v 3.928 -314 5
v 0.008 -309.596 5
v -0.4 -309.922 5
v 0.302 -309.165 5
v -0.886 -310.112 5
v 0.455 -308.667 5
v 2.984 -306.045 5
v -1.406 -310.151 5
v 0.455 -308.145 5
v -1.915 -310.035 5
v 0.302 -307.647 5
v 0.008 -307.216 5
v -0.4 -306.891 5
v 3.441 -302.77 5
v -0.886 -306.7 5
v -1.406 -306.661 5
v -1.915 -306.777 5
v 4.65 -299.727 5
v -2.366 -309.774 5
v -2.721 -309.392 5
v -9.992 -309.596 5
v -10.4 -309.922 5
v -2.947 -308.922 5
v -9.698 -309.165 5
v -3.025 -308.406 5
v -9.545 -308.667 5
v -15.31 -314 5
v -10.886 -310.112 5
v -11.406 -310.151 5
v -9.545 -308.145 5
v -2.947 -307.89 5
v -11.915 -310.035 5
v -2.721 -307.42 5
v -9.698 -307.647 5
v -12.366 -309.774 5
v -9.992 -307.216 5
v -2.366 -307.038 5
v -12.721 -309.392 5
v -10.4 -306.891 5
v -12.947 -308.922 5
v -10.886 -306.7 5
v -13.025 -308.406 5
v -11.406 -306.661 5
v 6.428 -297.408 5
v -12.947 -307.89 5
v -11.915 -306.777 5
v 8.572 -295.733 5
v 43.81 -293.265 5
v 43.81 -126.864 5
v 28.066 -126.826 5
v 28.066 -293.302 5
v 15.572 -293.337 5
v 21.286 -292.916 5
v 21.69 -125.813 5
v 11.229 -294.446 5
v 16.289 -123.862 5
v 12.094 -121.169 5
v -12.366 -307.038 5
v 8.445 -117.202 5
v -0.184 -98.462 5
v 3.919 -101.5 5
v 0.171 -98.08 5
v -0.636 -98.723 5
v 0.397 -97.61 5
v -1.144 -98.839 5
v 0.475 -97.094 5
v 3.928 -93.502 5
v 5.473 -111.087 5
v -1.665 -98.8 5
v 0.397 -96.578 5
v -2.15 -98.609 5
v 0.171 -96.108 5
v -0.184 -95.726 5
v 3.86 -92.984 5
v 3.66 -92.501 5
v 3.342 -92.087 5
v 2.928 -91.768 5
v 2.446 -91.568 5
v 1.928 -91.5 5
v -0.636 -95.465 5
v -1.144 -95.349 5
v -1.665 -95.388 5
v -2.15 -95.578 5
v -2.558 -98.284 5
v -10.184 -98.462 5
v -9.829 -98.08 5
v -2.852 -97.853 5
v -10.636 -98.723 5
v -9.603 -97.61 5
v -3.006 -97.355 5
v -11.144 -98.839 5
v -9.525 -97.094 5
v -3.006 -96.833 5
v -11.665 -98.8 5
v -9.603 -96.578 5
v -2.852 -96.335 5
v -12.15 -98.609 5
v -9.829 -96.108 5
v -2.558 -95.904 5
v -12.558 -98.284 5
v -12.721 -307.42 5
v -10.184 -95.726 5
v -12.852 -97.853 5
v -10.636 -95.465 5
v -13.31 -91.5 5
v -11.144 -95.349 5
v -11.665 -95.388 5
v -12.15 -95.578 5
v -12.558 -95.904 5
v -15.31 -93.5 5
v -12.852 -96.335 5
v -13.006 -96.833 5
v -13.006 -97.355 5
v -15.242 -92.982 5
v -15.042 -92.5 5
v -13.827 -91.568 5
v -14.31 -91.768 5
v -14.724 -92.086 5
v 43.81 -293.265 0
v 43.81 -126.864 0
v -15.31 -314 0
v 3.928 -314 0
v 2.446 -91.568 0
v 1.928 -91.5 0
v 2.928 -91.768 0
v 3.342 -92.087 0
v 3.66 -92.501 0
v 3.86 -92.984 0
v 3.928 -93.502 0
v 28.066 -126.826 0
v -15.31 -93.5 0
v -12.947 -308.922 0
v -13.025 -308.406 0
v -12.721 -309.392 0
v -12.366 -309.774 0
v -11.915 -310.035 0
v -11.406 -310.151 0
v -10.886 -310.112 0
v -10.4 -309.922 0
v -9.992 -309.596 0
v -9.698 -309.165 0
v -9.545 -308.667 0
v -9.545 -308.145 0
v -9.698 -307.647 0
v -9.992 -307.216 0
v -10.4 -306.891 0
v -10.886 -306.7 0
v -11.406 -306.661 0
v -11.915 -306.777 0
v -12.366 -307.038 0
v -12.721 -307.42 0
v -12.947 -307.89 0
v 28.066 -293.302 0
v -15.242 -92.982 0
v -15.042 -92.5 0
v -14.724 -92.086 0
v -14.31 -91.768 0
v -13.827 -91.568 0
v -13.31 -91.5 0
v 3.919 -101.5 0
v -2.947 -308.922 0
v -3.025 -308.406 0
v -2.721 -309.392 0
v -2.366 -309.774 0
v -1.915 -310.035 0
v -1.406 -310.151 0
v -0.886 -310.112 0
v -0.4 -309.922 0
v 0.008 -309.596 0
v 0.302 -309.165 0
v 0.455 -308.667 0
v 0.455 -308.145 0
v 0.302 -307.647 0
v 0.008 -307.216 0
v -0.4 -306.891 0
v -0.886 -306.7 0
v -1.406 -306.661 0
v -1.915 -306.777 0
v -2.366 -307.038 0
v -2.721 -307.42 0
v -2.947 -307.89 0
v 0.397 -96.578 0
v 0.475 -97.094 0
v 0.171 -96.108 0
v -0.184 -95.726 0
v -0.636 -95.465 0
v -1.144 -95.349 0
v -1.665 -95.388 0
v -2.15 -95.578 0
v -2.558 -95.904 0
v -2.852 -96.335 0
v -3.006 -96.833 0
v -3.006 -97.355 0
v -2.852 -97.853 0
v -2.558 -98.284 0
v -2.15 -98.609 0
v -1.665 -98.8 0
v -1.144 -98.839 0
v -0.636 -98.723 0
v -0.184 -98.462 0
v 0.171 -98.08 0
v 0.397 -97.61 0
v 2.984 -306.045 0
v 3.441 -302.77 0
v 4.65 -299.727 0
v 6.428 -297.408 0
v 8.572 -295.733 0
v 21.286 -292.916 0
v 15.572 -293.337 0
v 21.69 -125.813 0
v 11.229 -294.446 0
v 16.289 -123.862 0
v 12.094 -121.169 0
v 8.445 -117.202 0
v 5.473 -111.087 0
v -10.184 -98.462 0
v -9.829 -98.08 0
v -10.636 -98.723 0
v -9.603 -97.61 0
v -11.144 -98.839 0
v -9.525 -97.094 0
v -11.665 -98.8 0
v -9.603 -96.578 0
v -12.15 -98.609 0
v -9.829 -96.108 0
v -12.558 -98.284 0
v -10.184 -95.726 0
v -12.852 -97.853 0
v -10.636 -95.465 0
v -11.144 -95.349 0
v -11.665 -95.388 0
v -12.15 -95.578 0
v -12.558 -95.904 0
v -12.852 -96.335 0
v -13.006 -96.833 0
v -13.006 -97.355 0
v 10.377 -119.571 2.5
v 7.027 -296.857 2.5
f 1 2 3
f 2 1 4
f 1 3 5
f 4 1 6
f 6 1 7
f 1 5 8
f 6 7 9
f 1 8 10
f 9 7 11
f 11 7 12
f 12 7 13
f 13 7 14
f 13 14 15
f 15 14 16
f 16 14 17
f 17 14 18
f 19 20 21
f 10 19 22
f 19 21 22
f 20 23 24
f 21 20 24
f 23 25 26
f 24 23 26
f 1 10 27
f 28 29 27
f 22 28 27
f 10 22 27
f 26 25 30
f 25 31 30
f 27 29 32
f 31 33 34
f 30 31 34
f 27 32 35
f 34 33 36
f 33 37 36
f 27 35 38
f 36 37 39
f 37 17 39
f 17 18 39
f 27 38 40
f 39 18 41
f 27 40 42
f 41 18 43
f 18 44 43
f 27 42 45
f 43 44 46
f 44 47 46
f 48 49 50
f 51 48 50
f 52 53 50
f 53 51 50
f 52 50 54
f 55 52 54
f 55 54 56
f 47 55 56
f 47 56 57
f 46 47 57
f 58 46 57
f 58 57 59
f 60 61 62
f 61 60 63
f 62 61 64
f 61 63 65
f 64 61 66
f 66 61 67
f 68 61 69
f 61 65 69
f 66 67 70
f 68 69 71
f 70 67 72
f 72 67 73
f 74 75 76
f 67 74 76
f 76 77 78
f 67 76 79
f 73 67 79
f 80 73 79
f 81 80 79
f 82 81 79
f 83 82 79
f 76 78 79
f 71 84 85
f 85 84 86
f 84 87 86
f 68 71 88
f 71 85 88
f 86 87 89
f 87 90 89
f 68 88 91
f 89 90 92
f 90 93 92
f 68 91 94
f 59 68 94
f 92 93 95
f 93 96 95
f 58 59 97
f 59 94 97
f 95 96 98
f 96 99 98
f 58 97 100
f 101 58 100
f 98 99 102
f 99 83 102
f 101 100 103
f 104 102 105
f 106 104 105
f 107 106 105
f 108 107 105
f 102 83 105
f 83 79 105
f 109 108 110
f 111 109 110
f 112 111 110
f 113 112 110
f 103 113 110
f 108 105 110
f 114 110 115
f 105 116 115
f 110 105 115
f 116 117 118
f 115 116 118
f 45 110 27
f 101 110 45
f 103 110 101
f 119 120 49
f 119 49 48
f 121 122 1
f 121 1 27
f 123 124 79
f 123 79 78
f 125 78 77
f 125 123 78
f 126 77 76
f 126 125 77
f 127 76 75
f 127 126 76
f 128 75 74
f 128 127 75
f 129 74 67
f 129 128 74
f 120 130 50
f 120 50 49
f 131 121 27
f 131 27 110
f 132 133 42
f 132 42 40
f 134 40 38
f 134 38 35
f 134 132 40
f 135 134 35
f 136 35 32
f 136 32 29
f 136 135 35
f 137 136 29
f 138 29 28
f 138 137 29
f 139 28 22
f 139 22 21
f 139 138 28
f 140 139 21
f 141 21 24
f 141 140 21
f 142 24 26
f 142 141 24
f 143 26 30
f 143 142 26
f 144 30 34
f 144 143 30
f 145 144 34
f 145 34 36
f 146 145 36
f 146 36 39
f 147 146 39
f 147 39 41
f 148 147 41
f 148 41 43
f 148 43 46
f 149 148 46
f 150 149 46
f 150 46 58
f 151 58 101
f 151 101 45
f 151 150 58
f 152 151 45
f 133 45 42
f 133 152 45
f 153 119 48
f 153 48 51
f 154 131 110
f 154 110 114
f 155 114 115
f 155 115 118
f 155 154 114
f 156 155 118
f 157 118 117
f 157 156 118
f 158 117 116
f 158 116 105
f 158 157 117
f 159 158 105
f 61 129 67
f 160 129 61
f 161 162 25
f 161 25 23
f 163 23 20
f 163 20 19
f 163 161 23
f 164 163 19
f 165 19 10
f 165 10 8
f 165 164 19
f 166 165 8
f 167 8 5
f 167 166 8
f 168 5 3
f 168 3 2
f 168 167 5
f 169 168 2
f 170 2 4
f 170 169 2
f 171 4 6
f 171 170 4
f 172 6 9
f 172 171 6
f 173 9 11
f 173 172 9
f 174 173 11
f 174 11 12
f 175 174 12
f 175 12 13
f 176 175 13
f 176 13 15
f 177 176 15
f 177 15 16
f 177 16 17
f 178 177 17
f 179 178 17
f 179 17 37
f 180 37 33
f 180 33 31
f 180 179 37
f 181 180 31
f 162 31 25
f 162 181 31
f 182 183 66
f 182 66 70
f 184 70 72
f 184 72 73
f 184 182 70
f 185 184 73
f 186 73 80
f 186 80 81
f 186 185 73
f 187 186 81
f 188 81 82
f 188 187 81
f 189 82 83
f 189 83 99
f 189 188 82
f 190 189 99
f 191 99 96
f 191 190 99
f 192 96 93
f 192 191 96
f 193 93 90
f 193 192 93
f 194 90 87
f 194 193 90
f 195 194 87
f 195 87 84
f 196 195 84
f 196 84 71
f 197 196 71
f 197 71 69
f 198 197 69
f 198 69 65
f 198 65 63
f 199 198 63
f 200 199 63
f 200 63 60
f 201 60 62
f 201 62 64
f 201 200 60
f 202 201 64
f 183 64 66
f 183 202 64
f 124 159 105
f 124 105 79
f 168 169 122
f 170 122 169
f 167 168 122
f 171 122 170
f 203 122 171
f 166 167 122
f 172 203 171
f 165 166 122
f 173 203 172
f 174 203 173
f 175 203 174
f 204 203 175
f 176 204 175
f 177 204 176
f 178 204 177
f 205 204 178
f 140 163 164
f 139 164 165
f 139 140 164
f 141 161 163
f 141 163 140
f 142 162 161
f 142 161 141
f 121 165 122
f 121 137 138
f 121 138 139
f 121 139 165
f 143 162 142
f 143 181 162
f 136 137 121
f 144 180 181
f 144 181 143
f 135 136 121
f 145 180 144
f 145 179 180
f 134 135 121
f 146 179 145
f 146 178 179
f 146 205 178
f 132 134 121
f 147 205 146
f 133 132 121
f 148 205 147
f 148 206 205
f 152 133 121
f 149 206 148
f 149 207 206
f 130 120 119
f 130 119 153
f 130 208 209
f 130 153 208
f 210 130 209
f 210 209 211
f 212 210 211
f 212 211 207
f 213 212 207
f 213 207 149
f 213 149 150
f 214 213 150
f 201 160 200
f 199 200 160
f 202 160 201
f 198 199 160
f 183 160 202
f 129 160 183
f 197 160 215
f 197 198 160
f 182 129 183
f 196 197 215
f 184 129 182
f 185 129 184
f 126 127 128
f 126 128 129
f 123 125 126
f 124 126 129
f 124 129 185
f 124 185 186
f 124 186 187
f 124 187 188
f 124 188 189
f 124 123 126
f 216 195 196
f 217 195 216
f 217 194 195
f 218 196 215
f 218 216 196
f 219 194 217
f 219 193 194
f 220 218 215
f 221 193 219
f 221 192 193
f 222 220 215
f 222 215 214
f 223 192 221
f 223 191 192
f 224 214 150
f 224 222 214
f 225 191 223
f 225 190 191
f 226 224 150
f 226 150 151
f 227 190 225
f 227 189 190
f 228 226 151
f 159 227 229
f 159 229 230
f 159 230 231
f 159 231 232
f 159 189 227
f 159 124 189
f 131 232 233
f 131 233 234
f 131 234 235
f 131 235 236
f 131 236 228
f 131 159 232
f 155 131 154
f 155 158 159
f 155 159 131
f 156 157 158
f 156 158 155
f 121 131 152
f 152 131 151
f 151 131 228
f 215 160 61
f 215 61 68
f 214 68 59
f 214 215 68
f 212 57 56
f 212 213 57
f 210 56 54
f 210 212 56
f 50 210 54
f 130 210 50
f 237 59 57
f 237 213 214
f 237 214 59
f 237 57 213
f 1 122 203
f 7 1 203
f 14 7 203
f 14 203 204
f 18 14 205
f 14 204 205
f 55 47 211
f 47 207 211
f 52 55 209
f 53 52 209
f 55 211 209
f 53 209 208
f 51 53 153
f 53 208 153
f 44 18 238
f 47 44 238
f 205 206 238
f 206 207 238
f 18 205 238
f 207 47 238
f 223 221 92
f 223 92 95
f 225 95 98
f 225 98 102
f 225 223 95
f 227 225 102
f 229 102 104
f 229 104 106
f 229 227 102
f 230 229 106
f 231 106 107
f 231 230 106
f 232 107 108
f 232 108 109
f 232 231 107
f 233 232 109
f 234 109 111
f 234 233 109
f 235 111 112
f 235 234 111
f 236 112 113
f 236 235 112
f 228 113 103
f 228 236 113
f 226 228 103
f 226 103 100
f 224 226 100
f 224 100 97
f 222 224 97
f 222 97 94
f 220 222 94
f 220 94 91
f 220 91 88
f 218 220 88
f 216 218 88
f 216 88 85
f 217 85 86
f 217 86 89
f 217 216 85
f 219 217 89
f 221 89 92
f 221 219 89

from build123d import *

# Parameters (mm, degrees)
SKETCH1_R           = 1.75
BOSS_EXTRUDE1_DEPTH = 5


with BuildPart() as part:
    # Sketch1 → Boss-Extrude1 (new body)
    with BuildSketch(Plane.XY):
        with BuildLine():
            Line((3.927550053, -314), (1.927551127, -314))
            Line((1.927551127, -314), (-13.309839226, -314))
            Line((-13.309839226, -314), (-15.309839226, -314))
            Line((-15.309839226, -314), (-15.309839226, -106.128211153))
            Line((-15.309839226, -106.128211153), (-15.309839226, -93.5))
            ThreePointArc((-15.309839226, -93.5), (-14.724052788, -92.085786438), (-13.309839226, -91.5))
            Line((-13.309839226, -91.5), (1.927551127, -91.5))
            ThreePointArc((1.927551127, -91.5), (3.342497106, -92.086519234), (3.927550053, -93.502072123))
            Line((3.927550053, -93.502072123), (3.919263706, -101.5))
            add(Edge.make_bspline(
                [(3.919263706, -101.5), (4.762029824, -124.978966699), (28.065591749, -126.82575045)],
                knots=[0, 0, 0, 1, 1, 1], degree=2))
            Line((28.065591749, -126.82575045), (43.809757496, -126.863648017))
            Line((43.809757496, -126.863648017), (43.809757496, -293.264563137))
            Line((43.809757496, -293.264563137), (28.065591749, -293.302460704))
            add(Edge.make_bspline(
                [(3.927550053, -314), (-1.943550438, -290.062596381), (28.065591749, -293.302460704)],
                knots=[0, 0, 0, 1, 1, 1], degree=2))
        make_face()
        with Locations((-11.275154001, -97.093813656)):
            Circle(SKETCH1_R, mode=Mode.SUBTRACT)
        with Locations((-1.275154001, -97.093813656)):
            Circle(SKETCH1_R, mode=Mode.SUBTRACT)
        with Locations(Location((-1.275154001, -308.406186344, 0), (0, 0, 180))):
            Circle(SKETCH1_R, mode=Mode.SUBTRACT)
        with Locations(Location((-11.275154001, -308.406186344, 0), (0, 0, 180))):
            Circle(SKETCH1_R, mode=Mode.SUBTRACT)
    extrude(amount=BOSS_EXTRUDE1_DEPTH)


solid = part.part
